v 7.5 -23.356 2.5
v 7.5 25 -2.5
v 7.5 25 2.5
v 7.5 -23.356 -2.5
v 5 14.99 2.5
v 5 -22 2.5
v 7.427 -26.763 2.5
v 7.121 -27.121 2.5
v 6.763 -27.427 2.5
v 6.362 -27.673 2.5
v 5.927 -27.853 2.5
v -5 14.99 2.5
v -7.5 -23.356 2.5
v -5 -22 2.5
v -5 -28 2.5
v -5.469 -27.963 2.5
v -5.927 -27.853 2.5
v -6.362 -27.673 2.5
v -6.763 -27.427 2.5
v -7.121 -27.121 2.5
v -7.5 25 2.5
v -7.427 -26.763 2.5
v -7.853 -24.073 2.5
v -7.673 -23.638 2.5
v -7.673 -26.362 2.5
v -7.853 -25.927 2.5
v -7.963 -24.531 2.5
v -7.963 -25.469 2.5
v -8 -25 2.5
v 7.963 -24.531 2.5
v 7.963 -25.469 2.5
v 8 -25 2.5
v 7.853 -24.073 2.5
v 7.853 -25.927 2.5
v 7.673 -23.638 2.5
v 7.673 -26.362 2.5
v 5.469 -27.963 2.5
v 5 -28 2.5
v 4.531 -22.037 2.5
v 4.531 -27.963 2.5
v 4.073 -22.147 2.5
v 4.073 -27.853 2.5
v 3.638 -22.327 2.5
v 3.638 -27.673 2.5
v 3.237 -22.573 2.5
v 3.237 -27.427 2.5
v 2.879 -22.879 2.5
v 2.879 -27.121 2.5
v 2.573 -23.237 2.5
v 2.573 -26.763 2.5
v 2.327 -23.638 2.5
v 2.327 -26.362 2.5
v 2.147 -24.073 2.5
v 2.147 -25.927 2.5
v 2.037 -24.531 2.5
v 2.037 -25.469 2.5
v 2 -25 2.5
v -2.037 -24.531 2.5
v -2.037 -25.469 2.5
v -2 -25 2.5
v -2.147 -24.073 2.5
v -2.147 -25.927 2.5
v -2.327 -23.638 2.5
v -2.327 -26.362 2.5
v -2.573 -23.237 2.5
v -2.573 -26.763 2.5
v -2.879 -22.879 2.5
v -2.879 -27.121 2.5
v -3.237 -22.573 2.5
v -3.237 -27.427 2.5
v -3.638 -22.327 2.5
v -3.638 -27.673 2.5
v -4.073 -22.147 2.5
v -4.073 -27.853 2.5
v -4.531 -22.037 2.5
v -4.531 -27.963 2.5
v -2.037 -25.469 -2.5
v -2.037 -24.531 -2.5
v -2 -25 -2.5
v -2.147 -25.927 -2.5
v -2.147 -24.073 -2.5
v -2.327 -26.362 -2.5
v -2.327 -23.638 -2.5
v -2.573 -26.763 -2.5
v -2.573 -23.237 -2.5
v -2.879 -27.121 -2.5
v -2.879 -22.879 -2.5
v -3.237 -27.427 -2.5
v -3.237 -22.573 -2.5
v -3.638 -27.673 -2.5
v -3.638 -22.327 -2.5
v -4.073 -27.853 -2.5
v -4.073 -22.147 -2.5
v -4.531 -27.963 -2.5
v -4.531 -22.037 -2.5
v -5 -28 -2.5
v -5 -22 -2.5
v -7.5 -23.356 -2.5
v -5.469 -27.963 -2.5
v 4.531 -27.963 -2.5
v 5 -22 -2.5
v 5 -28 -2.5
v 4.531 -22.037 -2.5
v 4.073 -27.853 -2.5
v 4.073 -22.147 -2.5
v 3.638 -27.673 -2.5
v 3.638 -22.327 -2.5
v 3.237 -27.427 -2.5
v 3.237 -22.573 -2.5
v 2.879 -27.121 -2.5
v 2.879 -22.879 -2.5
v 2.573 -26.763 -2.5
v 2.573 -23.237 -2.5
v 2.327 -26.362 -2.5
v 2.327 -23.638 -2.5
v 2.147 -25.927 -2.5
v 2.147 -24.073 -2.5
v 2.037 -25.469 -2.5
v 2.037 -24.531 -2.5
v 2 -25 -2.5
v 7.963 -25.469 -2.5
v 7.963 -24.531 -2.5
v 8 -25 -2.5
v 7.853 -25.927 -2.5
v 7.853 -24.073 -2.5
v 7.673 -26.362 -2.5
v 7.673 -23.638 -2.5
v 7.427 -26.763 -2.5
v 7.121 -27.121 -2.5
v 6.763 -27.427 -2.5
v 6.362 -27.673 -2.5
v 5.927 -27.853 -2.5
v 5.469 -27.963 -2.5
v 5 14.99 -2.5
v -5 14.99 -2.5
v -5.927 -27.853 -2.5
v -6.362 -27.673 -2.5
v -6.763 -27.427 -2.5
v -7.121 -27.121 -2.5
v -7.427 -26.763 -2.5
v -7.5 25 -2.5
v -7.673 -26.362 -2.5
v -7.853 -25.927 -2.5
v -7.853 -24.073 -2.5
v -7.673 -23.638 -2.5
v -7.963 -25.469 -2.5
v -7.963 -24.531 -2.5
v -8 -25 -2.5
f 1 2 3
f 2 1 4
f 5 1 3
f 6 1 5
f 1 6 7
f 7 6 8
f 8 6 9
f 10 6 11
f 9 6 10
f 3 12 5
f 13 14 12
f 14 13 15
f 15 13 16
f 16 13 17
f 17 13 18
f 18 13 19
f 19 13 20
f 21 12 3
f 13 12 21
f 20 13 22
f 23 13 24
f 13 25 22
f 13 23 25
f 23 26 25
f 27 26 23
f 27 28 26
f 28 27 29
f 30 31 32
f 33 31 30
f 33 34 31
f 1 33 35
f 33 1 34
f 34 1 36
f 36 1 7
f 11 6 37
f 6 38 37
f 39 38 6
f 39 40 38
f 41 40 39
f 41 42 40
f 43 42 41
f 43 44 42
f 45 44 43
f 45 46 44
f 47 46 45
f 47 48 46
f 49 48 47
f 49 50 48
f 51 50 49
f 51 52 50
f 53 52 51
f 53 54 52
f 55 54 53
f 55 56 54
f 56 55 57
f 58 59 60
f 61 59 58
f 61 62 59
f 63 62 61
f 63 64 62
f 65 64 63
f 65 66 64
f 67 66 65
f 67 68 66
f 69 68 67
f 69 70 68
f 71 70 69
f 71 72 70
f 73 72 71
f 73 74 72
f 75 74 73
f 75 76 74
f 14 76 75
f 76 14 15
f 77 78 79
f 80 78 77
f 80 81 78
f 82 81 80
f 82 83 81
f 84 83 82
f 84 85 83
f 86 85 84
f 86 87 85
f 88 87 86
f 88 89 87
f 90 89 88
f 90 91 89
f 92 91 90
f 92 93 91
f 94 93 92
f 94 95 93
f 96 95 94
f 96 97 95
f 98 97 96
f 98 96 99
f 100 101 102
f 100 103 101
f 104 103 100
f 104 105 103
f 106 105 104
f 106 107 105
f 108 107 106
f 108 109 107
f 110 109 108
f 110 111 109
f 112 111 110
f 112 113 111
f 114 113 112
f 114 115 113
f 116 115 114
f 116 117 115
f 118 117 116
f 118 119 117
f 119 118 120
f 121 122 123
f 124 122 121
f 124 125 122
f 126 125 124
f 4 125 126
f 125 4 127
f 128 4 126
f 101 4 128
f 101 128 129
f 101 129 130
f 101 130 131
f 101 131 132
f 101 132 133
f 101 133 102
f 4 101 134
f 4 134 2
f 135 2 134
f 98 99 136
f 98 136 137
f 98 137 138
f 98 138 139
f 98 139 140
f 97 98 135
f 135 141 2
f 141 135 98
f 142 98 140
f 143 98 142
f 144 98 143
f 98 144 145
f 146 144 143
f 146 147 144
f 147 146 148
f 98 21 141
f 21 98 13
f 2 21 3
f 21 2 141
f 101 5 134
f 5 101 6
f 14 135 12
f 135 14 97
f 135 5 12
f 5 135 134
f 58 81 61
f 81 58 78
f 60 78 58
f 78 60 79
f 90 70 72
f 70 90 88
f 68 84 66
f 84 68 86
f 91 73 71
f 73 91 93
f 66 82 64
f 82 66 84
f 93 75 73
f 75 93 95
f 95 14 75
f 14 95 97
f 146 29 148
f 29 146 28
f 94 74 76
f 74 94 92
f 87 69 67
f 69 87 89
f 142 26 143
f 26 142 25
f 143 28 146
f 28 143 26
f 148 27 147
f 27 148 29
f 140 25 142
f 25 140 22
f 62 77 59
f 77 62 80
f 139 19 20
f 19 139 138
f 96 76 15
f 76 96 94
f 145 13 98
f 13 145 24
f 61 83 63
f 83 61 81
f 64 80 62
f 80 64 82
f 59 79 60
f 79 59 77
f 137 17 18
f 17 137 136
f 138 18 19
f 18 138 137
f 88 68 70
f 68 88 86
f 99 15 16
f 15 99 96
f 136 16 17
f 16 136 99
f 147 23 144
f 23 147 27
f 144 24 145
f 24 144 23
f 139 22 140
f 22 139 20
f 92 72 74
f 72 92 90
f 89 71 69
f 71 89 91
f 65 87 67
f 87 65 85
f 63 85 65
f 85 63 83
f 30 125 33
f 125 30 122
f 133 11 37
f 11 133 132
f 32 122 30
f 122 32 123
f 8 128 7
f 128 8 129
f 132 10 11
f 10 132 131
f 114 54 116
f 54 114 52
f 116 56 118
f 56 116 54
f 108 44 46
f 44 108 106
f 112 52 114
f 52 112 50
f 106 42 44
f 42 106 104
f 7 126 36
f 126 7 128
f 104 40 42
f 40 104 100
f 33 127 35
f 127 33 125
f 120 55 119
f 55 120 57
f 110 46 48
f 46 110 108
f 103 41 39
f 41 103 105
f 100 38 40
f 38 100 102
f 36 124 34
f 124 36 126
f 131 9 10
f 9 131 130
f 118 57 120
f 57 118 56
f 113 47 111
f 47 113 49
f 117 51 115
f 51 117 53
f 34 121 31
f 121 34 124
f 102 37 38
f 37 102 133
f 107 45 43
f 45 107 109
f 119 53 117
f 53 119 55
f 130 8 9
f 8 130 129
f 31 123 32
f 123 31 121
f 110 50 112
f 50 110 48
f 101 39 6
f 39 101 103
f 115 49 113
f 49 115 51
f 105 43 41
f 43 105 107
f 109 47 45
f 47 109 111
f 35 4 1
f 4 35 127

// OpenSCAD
difference()
{
	cube([15,50,5], center=true);

	translate([0,-5.01,.1])
	cube([10,40,6], center=true);
}

translate([-5,-25,-2.5])
linear_extrude(height=5, $fn=40)
circle(3);

translate([5,-25,-2.5])
linear_extrude(height=5, $fn=40)
circle(3);
